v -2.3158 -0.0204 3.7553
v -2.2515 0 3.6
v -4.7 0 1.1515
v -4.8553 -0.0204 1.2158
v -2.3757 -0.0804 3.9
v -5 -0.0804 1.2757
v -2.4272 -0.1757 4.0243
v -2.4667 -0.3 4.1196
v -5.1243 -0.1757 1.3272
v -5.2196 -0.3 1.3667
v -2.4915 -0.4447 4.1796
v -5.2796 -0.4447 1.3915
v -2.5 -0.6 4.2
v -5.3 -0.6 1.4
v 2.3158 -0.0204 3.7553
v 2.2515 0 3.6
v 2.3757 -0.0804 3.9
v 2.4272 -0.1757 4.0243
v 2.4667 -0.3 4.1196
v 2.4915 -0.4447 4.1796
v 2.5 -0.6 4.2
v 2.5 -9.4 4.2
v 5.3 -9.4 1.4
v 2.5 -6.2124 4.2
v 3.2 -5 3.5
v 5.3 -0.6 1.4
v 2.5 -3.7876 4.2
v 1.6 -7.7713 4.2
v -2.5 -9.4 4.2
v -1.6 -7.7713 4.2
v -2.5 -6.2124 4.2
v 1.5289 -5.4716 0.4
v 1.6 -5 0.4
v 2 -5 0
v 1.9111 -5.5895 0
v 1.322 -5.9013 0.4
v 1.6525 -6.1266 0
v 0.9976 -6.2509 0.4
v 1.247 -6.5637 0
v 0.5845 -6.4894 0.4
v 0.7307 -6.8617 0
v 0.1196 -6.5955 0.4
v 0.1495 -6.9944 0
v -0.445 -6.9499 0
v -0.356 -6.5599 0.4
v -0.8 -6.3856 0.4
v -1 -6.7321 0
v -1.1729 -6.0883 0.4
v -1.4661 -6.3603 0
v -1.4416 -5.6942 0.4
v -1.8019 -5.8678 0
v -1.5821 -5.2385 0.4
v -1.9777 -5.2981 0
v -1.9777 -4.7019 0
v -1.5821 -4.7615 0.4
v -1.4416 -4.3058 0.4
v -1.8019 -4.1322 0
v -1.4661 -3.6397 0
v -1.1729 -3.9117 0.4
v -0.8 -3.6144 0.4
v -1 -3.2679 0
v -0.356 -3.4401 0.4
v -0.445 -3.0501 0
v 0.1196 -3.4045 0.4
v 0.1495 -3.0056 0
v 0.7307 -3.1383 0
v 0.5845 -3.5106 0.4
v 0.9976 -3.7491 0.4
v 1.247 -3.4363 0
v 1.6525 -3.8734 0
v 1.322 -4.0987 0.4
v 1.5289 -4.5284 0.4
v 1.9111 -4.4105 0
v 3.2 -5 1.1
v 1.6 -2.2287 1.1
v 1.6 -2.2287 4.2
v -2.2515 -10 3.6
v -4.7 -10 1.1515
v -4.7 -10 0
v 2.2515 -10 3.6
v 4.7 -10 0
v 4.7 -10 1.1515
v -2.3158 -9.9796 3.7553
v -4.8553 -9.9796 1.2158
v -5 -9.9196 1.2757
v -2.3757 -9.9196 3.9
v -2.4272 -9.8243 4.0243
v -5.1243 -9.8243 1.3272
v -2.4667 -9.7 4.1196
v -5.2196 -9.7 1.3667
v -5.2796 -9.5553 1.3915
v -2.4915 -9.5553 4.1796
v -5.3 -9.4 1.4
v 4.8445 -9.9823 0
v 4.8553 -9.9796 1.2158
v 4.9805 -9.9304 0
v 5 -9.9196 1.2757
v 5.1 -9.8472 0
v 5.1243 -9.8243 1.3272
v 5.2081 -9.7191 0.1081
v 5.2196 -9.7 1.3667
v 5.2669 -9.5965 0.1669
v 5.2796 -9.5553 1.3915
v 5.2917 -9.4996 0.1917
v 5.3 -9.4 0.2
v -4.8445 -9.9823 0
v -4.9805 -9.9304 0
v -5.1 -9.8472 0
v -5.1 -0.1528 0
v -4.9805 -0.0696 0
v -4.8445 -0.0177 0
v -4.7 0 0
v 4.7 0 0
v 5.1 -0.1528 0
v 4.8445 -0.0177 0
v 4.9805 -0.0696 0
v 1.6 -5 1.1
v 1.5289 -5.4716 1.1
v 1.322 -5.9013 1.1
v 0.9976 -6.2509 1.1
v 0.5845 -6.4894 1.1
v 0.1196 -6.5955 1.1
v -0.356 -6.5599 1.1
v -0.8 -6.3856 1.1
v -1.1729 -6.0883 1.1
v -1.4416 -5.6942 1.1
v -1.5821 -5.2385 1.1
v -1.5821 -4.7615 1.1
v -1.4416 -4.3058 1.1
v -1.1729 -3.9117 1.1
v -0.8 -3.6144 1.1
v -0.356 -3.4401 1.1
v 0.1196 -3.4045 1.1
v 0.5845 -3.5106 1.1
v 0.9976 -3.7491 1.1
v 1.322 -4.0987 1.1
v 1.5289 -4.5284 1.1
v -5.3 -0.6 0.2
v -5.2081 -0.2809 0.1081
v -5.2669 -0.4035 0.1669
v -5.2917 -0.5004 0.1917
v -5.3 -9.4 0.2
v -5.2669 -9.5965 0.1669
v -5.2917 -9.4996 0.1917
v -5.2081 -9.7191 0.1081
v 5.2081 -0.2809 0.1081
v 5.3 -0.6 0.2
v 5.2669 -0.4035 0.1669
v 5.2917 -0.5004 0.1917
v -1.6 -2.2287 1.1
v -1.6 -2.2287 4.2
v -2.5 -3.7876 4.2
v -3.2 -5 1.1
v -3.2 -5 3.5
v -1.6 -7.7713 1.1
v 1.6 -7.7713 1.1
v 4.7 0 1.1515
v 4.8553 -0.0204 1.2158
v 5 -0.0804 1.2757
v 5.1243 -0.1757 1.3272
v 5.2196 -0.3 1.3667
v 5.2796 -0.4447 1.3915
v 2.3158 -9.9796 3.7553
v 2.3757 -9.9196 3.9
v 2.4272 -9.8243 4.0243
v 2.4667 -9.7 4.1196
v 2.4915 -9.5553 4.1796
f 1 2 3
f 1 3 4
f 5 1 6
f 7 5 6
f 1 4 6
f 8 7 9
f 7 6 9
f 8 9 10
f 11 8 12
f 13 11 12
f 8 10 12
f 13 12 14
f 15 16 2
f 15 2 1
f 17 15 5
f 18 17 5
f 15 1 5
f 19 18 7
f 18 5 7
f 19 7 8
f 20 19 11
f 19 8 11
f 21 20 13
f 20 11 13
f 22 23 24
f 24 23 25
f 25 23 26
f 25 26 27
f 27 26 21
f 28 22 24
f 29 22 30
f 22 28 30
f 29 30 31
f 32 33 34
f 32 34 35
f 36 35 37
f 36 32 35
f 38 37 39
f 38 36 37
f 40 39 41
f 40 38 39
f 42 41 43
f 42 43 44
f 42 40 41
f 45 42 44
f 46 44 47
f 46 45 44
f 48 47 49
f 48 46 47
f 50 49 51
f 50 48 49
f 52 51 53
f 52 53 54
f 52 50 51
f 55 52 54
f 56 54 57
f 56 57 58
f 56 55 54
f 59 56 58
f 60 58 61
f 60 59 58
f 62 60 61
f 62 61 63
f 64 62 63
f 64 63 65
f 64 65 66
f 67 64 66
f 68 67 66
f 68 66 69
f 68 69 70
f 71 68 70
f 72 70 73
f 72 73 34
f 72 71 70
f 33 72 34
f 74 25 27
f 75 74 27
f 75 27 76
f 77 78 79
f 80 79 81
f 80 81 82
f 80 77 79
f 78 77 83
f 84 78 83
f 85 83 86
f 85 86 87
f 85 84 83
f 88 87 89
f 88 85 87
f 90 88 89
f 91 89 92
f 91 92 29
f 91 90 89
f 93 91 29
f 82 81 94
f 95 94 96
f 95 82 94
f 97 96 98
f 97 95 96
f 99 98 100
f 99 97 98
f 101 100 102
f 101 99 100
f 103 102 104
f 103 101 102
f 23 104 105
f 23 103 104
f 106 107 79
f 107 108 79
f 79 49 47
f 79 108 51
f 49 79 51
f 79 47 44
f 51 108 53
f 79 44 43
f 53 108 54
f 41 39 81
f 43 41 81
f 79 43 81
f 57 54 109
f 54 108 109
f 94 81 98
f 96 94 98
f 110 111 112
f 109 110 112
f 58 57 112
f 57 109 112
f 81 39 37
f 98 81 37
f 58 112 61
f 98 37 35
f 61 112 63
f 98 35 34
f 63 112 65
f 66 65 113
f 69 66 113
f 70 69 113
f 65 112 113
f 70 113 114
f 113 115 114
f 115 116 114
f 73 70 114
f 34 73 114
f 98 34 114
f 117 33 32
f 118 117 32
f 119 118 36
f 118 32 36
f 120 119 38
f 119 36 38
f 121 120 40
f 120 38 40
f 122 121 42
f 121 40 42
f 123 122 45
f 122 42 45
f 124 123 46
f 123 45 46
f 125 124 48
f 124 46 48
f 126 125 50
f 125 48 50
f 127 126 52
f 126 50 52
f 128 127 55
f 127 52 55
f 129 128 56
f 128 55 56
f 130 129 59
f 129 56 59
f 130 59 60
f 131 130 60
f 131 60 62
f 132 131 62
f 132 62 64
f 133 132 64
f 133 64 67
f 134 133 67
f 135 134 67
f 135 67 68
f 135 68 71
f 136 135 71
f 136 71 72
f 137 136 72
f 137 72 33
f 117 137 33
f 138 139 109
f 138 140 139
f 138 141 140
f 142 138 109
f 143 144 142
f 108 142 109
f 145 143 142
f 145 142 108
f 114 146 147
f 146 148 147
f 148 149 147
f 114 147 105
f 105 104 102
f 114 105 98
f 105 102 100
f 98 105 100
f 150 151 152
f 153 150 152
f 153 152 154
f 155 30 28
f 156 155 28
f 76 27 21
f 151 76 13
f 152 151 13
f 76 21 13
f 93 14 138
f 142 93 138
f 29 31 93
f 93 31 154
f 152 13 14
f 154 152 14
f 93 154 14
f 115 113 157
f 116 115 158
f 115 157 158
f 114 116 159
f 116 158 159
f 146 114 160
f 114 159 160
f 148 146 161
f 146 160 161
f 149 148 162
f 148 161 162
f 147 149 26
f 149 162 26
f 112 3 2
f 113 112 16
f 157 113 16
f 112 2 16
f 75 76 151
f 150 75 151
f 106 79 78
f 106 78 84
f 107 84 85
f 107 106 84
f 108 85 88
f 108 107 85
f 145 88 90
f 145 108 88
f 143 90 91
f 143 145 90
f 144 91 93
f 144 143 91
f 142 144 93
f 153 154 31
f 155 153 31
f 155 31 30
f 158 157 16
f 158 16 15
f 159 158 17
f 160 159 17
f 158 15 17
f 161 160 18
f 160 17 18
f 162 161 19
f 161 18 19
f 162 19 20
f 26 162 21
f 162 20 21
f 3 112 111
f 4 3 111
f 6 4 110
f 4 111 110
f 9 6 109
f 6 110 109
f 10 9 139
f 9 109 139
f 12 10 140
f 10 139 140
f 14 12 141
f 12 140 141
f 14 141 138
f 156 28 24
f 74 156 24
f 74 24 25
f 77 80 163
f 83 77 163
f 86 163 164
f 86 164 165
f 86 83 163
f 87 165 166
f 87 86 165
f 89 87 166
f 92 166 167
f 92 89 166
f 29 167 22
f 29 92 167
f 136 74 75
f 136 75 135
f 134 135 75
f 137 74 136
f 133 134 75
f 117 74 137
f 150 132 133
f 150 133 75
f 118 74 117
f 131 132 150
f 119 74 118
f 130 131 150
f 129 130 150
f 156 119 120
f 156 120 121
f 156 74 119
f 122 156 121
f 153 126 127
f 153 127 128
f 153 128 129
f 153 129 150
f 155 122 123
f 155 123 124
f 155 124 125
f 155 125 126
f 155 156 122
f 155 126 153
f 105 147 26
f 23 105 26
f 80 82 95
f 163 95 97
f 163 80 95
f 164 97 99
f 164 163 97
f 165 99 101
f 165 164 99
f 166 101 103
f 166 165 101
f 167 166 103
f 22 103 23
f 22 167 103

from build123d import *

# Parameters (mm, degrees)
PAD_DEPTH       = 10
POCKET_DEPTH    = 3.1
SKETCH002_R     = 1.6
POCKET001_DEPTH = 4.201
CHAMFER_SIZE    = 0.4
CHAMFER001_SIZE = 0.2
FILLET_R        = 0.6


with BuildPart() as part:
    # Sketch → Pad (new body)
    with BuildSketch(Plane.XZ):
        Polygon((-5.3, 0), (5.3, 0), (5.3, 1.4), (2.5, 4.2), (-2.5, 4.2), (-5.3, 1.4), align=None)
    extrude(amount=PAD_DEPTH)

    # Sketch001 → Pocket (cut)
    with BuildSketch(Plane(origin=(0, 0, 4.2), x_dir=(-1, 0, 0), z_dir=(0, 0, 1))):
        Polygon((1.6, 2.228719), (3.2, 5), (1.6, 7.771281), (-1.6, 7.771281), (-3.2, 5), (-1.6, 2.228719), align=None)
    extrude(amount=-POCKET_DEPTH, mode=Mode.SUBTRACT)

    # Sketch002 → Pocket001 (cut, through all)
    with BuildSketch(Plane(origin=(0, 0, 0), x_dir=(1, 0, 0), z_dir=(0, 0, -1))):
        with Locations((0, 5)):
            Circle(SKETCH002_R)
    extrude(amount=-POCKET001_DEPTH, mode=Mode.SUBTRACT)

    # Chamfer
    chamfer_edges = [part.edges().sort_by_distance(p)[0] for p in [
        (-1.6, -5, 0),
    ]]
    chamfer(chamfer_edges, length=CHAMFER_SIZE)

    # Chamfer001
    chamfer001_edges = [part.edges().sort_by_distance(p)[0] for p in [
        (-5.3, -5, 0),
        (5.3, -5, 0),
    ]]
    chamfer(chamfer001_edges, length=CHAMFER001_SIZE)

    # Fillet
    fillet_edges = [part.edges().sort_by_distance(p)[0] for p in [
        (-5.3, 0, 0.8),
        (5.3, 0, 0.8),
        (-3.9, 0, 2.8),
        (3.9, 0, 2.8),
        (0, 0, 4.2),
        (-5.3, -10, 0.8),
        (5.3, -10, 0.8),
        (-3.9, -10, 2.8),
        (3.9, -10, 2.8),
        (0, -10, 4.2),
    ]]
    fillet(fillet_edges, radius=FILLET_R)


solid = part.part
